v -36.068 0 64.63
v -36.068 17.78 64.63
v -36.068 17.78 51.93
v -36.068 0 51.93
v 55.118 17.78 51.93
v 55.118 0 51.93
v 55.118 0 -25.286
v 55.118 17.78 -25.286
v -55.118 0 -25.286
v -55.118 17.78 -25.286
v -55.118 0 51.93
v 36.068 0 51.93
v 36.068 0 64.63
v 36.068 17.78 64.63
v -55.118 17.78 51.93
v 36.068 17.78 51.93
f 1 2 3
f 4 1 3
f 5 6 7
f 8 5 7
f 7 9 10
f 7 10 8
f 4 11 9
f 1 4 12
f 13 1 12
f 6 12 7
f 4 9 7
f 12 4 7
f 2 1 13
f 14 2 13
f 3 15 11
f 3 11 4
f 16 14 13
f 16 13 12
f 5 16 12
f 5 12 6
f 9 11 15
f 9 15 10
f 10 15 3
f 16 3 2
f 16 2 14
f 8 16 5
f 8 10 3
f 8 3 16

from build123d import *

# Parameters (mm, degrees)
SKETCH1_W           = 110.236
SKETCH1_H           = 89.916
BOSS_EXTRUDE1_DEPTH = 17.78
SKETCH2_W           = 19.05
SKETCH2_H           = 12.7
CUT_EXTRUDE1_DEPTH  = 17.78


with BuildPart() as part:
    # Sketch1 → Boss-Extrude1 (new body)
    with BuildSketch(Plane(origin=(0, 0, 0), x_dir=(1, 0, 0), z_dir=(0, 1, 0))):
        with Locations((0, -19.671907216)):
            Rectangle(SKETCH1_W, SKETCH1_H)
    extrude(amount=BOSS_EXTRUDE1_DEPTH)

    # Sketch2 → Cut-Extrude1 (cut)
    with BuildSketch(Plane(origin=(0, 17.78, 0), x_dir=(1, 0, 0), z_dir=(0, 1, 0))):
        with Locations((-45.593, -58.279907216)):
            Rectangle(SKETCH2_W, SKETCH2_H)
        with Locations((45.593, -58.279907216)):
            Rectangle(SKETCH2_W, SKETCH2_H)
    extrude(amount=-CUT_EXTRUDE1_DEPTH, mode=Mode.SUBTRACT)


solid = part.part
